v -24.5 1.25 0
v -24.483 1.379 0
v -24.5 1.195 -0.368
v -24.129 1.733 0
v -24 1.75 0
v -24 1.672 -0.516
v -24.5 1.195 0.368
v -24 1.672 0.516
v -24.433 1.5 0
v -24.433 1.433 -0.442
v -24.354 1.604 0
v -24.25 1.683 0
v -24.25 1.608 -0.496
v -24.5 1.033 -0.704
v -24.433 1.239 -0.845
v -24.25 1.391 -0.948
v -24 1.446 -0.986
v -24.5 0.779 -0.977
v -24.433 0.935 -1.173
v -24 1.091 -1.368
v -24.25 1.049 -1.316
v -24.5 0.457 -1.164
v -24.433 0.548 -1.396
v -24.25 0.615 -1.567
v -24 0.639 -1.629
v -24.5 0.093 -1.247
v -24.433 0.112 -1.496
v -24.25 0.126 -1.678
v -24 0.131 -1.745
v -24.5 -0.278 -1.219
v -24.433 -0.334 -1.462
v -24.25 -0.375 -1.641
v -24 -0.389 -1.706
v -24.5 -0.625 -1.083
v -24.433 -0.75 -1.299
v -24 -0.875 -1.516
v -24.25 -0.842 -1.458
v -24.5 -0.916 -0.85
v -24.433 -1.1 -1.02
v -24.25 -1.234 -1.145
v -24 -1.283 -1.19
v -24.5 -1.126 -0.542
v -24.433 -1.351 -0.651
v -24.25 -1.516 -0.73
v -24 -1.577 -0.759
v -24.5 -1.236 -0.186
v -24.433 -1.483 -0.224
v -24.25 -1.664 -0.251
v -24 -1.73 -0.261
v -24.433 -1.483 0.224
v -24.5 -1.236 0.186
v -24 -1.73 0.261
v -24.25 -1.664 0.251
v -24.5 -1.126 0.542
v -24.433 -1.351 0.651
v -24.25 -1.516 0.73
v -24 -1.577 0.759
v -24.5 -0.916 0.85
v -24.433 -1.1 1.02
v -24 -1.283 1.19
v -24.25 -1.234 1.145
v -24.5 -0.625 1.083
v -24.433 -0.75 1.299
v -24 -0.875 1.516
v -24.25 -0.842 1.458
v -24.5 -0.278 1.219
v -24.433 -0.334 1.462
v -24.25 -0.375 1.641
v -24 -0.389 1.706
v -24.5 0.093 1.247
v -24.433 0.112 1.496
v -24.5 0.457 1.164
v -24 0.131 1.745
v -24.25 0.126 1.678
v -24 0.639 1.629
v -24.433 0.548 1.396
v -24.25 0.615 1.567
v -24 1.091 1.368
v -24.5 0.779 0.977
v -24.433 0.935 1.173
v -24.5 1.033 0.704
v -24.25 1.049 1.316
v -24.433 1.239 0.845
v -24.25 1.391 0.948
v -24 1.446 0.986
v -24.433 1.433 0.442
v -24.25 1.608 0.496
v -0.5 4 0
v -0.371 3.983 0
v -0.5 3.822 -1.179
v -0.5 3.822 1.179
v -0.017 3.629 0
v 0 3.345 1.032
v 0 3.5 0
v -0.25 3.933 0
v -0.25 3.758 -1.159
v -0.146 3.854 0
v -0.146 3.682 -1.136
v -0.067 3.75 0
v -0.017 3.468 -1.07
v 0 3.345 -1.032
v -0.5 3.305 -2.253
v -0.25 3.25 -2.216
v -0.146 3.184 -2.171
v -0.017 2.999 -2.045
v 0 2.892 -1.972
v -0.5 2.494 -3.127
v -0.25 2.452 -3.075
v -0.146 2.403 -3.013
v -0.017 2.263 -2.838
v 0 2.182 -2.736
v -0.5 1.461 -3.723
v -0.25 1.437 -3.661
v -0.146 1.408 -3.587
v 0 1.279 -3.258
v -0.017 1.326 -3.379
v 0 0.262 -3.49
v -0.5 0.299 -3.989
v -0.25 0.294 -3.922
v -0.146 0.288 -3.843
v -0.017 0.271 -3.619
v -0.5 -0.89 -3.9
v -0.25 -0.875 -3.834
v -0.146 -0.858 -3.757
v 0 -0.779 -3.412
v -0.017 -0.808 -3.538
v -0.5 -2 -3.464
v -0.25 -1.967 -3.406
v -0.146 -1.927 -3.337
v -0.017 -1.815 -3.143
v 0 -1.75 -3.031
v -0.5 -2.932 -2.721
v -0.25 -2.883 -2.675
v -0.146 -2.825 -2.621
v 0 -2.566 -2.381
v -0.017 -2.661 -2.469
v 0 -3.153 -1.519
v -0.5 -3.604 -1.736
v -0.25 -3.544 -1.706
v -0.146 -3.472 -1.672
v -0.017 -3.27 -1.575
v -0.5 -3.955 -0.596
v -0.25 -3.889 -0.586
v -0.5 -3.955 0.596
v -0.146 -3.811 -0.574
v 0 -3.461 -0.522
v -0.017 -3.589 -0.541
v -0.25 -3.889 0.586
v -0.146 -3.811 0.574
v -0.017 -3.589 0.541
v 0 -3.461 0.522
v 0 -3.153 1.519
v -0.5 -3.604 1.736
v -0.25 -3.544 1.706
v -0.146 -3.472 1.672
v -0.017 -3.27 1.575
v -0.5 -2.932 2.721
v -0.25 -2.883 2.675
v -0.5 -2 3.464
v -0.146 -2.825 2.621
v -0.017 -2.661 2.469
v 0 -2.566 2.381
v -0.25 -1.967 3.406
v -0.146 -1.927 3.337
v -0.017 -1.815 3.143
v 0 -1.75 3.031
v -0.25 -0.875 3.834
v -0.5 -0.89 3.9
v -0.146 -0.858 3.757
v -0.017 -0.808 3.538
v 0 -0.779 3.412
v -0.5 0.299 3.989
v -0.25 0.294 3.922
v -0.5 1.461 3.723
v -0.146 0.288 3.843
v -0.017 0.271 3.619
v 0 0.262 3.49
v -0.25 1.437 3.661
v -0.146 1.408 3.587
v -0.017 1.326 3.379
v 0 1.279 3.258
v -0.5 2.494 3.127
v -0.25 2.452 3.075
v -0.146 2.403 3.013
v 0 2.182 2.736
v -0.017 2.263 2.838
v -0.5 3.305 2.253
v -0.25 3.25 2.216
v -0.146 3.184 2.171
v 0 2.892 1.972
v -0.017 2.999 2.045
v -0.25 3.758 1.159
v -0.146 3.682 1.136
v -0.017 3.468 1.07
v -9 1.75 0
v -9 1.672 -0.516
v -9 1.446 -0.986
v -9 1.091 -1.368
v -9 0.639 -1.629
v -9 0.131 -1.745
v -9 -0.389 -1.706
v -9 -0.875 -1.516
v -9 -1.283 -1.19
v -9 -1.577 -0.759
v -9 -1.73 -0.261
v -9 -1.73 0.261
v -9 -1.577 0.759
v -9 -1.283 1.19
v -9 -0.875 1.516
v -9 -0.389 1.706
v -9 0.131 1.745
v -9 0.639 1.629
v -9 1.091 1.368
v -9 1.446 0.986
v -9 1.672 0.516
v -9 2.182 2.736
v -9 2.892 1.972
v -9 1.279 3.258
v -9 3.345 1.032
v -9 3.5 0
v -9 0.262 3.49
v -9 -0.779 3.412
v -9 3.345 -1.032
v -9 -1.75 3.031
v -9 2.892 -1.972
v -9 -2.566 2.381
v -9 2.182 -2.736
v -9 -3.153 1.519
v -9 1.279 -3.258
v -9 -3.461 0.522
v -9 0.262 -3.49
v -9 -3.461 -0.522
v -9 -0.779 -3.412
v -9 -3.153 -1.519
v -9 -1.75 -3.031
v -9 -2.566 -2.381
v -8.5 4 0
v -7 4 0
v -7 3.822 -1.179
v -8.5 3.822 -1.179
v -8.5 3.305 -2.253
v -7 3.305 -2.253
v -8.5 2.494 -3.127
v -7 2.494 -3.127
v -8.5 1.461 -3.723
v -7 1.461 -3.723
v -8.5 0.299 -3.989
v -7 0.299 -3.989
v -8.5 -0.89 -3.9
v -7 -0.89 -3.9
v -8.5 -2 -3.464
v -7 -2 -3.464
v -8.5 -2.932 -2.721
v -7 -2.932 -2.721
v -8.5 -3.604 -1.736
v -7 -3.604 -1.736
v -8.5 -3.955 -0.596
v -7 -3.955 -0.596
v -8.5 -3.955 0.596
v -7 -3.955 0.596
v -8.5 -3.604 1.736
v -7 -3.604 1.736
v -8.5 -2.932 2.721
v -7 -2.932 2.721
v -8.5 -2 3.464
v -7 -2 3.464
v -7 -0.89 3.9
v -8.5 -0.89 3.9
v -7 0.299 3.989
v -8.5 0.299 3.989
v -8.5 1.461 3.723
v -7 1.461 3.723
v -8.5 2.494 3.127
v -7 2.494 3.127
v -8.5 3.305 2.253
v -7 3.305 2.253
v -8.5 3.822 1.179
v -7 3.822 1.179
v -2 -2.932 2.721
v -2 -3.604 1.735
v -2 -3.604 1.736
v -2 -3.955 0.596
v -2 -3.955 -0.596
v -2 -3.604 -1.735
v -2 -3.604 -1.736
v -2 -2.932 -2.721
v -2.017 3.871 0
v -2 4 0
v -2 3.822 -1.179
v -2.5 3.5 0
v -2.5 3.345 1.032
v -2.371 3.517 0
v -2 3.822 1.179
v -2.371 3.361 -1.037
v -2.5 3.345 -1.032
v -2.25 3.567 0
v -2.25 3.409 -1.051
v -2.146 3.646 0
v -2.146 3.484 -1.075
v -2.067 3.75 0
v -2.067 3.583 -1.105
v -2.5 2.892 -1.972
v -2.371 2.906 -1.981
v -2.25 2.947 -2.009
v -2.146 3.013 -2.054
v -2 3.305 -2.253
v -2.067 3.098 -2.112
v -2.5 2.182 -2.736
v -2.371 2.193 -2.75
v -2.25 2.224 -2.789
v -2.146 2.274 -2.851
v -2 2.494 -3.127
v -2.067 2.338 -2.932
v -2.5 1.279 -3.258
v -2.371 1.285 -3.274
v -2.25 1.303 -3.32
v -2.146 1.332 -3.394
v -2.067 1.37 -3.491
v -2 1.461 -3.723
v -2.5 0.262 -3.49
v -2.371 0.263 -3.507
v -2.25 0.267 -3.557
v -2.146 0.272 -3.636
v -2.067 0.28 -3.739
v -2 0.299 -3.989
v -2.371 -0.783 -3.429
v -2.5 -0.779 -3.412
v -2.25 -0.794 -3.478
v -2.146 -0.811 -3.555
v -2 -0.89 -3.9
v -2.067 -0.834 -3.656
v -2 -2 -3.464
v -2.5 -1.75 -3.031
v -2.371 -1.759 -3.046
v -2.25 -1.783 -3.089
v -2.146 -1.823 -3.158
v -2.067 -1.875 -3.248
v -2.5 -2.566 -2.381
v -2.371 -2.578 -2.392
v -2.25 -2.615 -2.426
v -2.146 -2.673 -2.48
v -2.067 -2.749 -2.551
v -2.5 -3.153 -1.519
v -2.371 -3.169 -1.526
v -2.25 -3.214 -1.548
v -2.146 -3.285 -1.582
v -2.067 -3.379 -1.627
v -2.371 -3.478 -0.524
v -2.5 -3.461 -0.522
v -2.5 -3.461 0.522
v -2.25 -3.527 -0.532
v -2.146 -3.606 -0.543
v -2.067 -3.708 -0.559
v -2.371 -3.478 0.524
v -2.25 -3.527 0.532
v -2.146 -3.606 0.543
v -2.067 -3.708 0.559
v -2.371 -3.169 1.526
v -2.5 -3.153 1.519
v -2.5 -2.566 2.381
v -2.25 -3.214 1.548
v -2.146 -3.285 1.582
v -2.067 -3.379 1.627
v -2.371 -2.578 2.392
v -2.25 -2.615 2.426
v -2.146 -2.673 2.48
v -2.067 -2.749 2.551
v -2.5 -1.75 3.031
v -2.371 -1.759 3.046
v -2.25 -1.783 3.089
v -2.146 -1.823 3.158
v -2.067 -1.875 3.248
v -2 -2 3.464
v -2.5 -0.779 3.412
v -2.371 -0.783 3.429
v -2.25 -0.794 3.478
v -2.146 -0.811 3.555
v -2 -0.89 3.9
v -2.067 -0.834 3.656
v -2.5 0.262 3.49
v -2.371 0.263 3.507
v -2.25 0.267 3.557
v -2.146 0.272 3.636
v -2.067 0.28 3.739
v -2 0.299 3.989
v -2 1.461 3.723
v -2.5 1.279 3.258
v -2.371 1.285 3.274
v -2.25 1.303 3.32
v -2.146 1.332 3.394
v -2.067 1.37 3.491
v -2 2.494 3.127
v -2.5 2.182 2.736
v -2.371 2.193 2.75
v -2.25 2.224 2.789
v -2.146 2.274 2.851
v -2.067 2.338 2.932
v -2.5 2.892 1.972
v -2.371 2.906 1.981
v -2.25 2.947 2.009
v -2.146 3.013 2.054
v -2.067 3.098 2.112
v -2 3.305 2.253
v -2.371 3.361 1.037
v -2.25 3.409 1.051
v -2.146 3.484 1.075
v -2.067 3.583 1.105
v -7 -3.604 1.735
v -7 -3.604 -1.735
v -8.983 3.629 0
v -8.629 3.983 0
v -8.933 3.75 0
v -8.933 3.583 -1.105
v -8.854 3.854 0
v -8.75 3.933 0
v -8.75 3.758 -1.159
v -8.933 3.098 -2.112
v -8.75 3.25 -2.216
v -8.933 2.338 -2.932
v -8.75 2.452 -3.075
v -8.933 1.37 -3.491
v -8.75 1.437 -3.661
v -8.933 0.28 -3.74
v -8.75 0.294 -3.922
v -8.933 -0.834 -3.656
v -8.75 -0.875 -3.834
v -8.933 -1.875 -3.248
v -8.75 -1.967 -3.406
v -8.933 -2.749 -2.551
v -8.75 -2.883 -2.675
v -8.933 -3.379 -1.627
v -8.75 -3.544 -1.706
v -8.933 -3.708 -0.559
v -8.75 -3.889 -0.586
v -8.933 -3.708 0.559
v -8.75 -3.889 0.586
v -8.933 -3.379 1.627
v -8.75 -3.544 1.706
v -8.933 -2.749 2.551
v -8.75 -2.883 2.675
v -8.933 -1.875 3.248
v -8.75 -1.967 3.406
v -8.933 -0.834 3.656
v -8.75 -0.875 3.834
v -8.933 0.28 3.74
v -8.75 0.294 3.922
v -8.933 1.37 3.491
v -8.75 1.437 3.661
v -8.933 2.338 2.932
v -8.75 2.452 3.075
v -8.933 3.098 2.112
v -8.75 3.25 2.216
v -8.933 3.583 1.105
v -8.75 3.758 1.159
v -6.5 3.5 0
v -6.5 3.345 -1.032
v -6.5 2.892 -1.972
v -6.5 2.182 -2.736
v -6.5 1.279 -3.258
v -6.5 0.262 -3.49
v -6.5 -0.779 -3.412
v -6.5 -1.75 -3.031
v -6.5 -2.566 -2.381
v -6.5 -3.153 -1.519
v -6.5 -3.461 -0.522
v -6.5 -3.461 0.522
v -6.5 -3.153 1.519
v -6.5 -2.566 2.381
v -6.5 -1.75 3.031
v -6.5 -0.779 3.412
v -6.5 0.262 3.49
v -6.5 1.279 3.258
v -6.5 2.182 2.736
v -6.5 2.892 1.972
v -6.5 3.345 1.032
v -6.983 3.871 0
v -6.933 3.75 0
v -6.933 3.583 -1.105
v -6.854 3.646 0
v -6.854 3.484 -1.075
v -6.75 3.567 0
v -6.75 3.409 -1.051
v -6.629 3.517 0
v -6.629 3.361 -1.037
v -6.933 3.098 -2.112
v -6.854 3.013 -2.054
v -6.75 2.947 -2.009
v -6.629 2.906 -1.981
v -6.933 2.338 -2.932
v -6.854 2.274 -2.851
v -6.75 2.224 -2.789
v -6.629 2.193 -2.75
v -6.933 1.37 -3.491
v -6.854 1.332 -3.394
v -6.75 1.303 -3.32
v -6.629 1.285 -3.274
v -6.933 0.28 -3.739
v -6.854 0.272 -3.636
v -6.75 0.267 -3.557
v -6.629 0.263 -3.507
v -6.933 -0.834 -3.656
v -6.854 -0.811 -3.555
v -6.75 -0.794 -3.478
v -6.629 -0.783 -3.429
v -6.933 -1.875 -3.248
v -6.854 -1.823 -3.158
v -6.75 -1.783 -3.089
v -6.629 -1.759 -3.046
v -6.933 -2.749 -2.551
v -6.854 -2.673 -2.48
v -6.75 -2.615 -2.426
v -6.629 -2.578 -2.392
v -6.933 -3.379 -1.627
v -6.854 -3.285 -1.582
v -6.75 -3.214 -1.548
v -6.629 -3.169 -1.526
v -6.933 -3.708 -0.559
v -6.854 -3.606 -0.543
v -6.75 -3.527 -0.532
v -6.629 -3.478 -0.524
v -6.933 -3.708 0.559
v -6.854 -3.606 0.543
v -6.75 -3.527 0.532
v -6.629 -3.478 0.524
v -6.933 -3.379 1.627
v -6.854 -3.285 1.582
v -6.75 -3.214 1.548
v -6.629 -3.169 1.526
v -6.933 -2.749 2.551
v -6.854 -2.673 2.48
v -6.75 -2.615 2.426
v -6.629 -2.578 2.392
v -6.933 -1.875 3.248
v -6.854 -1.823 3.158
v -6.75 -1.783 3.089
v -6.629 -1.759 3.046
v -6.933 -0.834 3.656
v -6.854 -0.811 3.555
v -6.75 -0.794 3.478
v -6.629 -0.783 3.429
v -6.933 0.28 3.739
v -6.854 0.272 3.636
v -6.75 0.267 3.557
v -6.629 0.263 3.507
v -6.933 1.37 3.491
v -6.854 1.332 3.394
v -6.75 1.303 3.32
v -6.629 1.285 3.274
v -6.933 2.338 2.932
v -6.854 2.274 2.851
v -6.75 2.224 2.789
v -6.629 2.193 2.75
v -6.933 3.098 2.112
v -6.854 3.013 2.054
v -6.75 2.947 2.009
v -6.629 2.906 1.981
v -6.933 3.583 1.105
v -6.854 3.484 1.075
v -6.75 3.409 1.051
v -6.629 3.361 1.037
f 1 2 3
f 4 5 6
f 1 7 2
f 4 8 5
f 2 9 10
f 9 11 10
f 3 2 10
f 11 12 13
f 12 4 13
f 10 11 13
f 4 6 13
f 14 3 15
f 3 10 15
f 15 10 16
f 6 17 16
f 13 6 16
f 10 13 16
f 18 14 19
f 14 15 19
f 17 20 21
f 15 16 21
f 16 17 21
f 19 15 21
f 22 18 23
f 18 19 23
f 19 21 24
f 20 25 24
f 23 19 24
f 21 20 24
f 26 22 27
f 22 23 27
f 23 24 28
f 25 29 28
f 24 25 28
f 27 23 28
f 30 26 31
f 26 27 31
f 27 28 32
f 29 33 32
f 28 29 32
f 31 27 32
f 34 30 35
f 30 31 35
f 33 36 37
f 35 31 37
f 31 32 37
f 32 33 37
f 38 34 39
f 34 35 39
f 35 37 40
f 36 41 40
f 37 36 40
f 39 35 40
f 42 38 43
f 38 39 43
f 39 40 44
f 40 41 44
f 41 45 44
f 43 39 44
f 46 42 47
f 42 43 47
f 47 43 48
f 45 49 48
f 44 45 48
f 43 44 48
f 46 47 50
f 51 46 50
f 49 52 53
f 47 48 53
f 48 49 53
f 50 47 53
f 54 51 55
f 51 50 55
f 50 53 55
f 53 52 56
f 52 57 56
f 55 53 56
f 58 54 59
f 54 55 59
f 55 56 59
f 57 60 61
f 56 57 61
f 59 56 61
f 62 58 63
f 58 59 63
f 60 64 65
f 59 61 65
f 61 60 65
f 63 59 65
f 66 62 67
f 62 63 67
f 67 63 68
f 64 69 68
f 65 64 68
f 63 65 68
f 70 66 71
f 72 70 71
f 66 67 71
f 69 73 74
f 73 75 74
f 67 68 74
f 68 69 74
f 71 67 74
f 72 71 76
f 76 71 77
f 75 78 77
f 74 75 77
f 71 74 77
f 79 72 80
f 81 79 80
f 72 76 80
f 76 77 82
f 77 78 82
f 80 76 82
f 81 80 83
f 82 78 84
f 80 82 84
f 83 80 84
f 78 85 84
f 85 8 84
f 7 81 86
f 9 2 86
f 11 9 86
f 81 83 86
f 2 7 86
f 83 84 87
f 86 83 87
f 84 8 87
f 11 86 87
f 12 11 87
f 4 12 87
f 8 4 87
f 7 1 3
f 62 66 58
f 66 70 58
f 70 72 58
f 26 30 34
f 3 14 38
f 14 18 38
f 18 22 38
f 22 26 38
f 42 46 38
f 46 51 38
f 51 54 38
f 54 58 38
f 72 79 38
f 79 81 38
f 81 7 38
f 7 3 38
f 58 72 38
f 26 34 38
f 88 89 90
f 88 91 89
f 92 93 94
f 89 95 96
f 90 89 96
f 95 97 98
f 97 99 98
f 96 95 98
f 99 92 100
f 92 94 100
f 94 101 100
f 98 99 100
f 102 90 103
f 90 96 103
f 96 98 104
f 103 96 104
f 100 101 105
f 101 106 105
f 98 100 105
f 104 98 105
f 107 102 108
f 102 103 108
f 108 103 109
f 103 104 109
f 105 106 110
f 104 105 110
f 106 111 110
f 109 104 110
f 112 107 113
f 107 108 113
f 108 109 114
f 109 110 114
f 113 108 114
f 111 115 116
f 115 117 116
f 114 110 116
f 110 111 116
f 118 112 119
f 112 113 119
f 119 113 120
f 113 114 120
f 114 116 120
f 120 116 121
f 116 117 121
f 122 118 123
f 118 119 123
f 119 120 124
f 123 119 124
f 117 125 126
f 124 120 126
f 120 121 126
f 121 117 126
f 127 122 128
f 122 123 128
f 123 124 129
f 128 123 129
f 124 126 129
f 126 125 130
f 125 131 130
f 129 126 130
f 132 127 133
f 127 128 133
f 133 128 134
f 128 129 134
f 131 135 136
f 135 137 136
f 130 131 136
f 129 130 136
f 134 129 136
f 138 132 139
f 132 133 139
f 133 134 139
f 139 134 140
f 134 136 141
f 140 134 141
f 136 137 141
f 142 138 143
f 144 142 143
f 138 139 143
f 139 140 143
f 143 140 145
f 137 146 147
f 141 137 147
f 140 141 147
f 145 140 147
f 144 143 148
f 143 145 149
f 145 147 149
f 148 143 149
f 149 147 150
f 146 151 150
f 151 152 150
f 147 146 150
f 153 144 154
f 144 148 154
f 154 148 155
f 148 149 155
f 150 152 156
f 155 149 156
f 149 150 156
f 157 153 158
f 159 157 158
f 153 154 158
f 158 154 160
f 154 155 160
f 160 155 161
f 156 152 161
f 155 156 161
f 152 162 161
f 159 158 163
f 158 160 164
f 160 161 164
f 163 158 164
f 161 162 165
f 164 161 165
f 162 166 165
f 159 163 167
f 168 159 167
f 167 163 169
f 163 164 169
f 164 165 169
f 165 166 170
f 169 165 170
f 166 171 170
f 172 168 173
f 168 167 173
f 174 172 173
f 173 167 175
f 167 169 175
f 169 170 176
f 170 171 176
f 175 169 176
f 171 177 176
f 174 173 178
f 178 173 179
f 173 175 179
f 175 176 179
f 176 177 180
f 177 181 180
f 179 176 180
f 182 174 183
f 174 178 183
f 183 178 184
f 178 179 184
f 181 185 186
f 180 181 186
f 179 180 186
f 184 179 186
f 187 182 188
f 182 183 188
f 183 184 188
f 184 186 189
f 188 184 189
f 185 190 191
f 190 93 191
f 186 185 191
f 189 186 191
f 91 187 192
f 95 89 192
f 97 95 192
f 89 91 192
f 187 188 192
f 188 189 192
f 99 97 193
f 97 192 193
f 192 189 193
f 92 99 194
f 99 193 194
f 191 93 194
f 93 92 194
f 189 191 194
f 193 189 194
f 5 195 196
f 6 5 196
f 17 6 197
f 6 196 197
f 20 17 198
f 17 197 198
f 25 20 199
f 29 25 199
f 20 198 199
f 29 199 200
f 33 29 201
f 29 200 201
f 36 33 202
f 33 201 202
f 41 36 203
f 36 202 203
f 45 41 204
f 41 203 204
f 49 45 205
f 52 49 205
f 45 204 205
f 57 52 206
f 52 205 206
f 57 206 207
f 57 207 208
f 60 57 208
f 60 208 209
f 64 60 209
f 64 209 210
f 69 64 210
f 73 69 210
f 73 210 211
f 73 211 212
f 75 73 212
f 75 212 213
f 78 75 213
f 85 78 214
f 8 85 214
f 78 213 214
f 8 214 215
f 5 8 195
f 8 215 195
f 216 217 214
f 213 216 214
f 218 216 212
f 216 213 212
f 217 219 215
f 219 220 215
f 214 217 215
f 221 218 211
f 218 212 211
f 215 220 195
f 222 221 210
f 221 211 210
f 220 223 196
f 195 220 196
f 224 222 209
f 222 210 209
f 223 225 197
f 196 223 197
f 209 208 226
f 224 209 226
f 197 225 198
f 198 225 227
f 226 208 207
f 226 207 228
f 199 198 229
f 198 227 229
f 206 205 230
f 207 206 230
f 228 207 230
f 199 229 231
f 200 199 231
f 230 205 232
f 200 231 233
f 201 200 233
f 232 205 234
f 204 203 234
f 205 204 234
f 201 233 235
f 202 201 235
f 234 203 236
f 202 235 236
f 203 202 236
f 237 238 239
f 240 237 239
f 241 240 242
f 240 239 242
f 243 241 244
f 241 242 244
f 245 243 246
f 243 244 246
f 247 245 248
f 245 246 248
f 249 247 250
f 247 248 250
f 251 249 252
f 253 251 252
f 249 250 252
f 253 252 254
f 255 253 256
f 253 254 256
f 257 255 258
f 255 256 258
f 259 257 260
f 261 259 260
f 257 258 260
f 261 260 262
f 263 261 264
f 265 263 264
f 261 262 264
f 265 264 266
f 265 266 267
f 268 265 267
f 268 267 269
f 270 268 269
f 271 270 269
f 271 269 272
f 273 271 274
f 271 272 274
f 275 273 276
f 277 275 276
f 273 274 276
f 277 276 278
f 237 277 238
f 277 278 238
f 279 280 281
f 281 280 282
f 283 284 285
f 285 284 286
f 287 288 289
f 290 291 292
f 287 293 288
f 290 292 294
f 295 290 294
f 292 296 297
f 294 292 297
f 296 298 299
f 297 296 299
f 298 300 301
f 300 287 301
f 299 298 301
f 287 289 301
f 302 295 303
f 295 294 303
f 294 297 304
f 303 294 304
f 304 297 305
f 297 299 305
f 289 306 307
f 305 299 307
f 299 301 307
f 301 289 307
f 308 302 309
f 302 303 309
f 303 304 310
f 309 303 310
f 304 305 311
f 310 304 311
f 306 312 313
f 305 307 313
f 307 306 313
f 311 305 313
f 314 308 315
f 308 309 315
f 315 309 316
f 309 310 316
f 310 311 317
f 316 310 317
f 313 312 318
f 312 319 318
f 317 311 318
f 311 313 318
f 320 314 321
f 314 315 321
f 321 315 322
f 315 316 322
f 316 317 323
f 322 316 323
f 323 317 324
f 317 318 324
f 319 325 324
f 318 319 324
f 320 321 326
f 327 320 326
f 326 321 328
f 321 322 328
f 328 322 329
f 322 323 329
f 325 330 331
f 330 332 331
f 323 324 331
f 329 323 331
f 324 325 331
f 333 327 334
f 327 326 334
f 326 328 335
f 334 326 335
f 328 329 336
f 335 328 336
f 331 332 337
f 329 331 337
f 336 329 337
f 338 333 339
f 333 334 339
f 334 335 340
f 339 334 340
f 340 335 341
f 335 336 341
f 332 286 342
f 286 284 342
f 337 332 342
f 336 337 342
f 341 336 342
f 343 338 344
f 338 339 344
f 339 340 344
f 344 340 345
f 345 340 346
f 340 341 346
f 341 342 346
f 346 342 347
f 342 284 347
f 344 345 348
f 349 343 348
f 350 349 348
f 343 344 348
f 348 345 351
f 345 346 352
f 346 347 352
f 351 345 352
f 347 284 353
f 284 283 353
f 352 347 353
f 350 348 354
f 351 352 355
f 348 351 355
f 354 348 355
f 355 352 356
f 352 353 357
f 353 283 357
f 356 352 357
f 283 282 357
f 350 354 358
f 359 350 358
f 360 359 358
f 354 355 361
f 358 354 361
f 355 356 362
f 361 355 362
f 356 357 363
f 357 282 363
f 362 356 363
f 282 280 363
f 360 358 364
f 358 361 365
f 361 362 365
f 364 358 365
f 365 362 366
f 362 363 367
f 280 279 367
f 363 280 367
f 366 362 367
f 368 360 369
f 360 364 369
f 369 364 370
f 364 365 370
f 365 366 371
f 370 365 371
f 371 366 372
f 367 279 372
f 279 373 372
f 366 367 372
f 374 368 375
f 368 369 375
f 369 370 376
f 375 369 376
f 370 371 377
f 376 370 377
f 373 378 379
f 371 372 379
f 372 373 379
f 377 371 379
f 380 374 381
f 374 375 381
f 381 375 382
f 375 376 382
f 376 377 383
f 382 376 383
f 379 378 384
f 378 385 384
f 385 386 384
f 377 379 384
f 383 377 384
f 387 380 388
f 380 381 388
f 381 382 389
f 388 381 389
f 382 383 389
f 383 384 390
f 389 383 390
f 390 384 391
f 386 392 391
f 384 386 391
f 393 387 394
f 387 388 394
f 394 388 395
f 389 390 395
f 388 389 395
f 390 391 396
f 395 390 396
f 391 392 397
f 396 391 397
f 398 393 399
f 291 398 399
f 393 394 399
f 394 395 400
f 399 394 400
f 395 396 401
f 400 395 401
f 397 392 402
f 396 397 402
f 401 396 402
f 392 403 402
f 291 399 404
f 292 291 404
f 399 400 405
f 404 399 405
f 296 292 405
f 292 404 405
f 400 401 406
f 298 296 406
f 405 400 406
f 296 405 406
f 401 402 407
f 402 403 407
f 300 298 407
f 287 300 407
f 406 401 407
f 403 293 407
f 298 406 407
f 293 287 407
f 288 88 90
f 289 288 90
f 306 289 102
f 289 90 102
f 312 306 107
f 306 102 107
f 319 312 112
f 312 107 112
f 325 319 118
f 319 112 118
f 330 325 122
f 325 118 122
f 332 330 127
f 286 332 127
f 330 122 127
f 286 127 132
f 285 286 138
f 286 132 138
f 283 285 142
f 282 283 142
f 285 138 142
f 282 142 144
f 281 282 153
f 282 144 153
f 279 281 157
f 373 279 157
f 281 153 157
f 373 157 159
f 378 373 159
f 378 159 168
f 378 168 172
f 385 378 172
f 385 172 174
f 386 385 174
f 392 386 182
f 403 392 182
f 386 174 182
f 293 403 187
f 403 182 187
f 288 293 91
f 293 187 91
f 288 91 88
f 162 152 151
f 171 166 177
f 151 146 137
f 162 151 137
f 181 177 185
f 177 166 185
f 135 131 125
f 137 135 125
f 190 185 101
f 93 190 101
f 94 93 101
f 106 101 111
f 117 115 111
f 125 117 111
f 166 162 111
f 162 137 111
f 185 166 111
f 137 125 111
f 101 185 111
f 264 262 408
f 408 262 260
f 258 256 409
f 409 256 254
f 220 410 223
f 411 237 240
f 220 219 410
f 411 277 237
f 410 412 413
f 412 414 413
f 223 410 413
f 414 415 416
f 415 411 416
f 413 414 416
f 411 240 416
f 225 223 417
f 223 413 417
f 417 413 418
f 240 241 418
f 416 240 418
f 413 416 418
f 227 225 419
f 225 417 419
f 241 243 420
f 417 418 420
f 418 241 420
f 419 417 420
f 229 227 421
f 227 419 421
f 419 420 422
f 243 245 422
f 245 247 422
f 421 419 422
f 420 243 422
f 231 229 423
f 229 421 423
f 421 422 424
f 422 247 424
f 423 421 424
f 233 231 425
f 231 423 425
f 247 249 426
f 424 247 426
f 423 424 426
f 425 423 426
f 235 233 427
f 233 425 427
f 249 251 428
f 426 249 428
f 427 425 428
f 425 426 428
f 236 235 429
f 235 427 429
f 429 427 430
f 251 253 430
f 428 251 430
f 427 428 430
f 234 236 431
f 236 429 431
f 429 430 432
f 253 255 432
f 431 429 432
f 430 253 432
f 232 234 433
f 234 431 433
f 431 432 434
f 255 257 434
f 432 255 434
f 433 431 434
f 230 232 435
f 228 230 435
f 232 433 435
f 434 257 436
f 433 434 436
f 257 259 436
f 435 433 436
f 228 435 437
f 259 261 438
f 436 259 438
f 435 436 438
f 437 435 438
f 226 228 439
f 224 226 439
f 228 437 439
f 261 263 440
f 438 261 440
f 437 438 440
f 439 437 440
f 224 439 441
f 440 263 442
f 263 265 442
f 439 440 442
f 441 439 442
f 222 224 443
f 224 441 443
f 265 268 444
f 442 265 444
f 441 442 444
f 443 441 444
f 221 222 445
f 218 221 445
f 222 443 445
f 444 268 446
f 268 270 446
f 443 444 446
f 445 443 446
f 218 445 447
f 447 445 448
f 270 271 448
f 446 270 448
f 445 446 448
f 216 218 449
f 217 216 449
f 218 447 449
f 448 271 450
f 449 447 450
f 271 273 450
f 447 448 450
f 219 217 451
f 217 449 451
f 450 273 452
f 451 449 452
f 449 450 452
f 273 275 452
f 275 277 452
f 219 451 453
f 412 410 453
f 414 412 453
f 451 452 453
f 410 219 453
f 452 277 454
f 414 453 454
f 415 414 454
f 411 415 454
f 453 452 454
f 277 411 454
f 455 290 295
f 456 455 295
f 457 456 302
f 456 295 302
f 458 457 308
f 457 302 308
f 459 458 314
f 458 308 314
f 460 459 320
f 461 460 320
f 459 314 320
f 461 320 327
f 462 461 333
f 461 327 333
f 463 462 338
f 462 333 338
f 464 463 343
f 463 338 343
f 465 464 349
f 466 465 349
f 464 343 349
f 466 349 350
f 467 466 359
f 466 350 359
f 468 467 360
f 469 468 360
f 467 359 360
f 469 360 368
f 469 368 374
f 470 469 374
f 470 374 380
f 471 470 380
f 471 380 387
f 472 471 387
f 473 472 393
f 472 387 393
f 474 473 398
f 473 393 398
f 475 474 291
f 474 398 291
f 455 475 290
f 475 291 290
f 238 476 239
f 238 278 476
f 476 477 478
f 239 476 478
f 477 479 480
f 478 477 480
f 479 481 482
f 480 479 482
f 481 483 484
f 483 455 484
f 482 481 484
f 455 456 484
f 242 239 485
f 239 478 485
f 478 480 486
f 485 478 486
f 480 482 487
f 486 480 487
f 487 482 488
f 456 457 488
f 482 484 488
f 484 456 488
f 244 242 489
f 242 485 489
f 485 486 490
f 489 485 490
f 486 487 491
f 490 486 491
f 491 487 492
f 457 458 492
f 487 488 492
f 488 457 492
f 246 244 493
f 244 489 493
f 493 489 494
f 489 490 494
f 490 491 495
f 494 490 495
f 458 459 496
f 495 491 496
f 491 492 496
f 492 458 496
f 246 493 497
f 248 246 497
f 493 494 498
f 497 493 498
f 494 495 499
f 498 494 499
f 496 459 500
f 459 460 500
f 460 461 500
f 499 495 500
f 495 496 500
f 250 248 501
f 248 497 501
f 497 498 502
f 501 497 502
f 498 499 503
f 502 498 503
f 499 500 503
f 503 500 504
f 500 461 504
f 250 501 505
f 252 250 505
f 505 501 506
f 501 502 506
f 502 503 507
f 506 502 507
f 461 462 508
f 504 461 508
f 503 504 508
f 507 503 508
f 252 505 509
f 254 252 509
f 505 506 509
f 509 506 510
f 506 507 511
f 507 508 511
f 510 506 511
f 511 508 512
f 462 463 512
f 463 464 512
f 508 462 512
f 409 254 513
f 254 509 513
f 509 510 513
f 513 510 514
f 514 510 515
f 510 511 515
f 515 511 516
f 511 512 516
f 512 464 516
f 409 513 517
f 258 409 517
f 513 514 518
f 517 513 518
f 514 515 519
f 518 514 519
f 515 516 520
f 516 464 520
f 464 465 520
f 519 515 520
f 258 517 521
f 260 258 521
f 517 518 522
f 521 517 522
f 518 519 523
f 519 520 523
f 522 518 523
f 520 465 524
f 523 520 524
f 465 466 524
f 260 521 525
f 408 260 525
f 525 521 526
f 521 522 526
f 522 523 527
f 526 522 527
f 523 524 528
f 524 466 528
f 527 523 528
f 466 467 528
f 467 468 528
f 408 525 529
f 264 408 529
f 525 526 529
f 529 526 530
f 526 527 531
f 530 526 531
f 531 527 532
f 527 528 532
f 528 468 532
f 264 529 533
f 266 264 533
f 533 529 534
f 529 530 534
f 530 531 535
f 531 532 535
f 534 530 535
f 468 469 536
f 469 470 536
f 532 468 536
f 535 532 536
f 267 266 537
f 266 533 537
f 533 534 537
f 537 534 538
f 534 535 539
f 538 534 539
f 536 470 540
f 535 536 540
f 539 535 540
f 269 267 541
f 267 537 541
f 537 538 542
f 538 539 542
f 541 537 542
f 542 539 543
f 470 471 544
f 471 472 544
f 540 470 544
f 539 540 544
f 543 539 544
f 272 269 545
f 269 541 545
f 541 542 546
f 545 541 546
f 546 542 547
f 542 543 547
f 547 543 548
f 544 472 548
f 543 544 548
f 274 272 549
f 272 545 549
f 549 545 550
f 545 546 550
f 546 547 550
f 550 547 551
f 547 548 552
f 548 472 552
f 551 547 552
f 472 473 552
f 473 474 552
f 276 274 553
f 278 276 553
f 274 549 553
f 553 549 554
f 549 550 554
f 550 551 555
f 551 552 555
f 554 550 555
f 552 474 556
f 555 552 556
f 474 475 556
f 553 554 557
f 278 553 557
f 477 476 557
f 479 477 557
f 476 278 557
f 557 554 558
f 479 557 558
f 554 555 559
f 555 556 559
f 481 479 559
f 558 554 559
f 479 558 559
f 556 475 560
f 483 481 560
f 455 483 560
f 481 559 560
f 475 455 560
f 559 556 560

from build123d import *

# Parameters (mm, degrees)
VERRUNDUNG1_R = 0.5


with BuildPart() as part:
    # Skizze1 → Rotation1 (revolve)
    with BuildSketch(Plane.XY):
        Polygon((0, 0), (-24.5, 0), (-24.5, 1.75), (-9, 1.75), (-9, 4), (-7, 4), (-7, 3.5), (-2, 3.5), (-2, 4), (0, 4), align=None)
    revolve(axis=Axis((0, 0, 0), (-1, 0, 0)))

    # Verrundung1
    verrundung1_edges = [part.edges().sort_by_distance(p)[0] for p in [
        (-24.5, -1.75, 0),
        (0, -4, 0),
        (-2, -3.5, 0),
        (-7, -3.5, 0),
        (-9, -4, 0),
    ]]
    fillet(verrundung1_edges, radius=VERRUNDUNG1_R - 0.0001)  # a hair under: the kernel refuses the full size


solid = part.part
